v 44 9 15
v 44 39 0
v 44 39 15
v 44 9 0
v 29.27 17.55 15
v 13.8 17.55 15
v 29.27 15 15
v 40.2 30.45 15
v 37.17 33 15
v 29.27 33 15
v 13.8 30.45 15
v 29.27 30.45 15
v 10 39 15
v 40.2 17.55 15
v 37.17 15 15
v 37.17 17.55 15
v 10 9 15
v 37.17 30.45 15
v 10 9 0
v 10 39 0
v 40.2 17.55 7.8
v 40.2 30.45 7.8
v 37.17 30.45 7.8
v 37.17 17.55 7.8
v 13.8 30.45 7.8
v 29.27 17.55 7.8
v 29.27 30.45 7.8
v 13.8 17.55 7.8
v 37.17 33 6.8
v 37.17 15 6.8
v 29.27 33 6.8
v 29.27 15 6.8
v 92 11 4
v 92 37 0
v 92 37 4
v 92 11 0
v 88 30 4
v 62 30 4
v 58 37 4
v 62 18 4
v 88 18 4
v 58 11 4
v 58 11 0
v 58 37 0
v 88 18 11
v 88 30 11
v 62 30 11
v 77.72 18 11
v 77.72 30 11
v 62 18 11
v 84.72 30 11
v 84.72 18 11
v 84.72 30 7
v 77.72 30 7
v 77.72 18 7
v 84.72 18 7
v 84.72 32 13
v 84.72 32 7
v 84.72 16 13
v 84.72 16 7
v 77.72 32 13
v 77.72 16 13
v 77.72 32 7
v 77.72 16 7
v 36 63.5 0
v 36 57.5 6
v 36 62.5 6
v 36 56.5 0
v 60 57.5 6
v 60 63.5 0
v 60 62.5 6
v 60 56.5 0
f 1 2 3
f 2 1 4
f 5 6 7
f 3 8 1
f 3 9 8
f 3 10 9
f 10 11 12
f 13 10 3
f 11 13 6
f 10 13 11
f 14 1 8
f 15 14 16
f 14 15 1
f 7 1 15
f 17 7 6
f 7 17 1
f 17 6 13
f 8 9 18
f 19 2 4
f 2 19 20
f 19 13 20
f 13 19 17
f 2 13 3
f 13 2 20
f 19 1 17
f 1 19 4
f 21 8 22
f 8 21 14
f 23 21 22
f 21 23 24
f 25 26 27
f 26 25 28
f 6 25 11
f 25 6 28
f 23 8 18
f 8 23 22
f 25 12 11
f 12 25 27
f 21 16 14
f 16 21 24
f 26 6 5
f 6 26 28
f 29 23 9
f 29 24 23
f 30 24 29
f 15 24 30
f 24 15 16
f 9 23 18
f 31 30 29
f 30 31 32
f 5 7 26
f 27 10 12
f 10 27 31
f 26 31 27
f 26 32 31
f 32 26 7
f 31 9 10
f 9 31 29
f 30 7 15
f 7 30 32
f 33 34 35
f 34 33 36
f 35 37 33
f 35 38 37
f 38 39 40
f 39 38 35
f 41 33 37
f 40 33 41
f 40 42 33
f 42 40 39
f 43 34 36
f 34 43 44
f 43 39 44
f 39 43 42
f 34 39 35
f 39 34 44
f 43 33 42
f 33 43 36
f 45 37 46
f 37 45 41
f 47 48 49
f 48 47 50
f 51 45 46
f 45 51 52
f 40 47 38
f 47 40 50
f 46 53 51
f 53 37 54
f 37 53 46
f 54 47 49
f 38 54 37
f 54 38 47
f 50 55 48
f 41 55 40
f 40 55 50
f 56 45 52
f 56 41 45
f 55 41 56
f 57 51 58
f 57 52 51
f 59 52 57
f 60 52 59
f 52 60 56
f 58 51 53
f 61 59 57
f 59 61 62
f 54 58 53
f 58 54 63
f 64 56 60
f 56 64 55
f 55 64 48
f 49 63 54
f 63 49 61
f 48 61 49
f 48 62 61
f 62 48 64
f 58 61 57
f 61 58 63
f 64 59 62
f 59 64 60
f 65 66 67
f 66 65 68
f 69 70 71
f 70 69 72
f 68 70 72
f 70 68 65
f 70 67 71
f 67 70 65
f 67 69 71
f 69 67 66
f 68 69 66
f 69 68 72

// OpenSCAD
/*
Sample 056: Nut-Feder-Verbindung mit Querkeil — 0,45 mm
Generated from the FDM Mechanical Sample Library.
Units: millimetres.

Override examples:
  openscad -o custom.stl -D 'view="plate"' -D 'render_fn=64' model.scad
  openscad -o preview.png -D 'view="assembly"' model.scad
*/
use <../../../library/fdm_mechanisms.scad>

render_fn = is_undef(render_fn) ? 48 : render_fn;
view = is_undef(view) ? "plate" : view;
$fn = render_fn;

sample_wedge_lock_joint(
    view=view,
    clearance=0.45
);
